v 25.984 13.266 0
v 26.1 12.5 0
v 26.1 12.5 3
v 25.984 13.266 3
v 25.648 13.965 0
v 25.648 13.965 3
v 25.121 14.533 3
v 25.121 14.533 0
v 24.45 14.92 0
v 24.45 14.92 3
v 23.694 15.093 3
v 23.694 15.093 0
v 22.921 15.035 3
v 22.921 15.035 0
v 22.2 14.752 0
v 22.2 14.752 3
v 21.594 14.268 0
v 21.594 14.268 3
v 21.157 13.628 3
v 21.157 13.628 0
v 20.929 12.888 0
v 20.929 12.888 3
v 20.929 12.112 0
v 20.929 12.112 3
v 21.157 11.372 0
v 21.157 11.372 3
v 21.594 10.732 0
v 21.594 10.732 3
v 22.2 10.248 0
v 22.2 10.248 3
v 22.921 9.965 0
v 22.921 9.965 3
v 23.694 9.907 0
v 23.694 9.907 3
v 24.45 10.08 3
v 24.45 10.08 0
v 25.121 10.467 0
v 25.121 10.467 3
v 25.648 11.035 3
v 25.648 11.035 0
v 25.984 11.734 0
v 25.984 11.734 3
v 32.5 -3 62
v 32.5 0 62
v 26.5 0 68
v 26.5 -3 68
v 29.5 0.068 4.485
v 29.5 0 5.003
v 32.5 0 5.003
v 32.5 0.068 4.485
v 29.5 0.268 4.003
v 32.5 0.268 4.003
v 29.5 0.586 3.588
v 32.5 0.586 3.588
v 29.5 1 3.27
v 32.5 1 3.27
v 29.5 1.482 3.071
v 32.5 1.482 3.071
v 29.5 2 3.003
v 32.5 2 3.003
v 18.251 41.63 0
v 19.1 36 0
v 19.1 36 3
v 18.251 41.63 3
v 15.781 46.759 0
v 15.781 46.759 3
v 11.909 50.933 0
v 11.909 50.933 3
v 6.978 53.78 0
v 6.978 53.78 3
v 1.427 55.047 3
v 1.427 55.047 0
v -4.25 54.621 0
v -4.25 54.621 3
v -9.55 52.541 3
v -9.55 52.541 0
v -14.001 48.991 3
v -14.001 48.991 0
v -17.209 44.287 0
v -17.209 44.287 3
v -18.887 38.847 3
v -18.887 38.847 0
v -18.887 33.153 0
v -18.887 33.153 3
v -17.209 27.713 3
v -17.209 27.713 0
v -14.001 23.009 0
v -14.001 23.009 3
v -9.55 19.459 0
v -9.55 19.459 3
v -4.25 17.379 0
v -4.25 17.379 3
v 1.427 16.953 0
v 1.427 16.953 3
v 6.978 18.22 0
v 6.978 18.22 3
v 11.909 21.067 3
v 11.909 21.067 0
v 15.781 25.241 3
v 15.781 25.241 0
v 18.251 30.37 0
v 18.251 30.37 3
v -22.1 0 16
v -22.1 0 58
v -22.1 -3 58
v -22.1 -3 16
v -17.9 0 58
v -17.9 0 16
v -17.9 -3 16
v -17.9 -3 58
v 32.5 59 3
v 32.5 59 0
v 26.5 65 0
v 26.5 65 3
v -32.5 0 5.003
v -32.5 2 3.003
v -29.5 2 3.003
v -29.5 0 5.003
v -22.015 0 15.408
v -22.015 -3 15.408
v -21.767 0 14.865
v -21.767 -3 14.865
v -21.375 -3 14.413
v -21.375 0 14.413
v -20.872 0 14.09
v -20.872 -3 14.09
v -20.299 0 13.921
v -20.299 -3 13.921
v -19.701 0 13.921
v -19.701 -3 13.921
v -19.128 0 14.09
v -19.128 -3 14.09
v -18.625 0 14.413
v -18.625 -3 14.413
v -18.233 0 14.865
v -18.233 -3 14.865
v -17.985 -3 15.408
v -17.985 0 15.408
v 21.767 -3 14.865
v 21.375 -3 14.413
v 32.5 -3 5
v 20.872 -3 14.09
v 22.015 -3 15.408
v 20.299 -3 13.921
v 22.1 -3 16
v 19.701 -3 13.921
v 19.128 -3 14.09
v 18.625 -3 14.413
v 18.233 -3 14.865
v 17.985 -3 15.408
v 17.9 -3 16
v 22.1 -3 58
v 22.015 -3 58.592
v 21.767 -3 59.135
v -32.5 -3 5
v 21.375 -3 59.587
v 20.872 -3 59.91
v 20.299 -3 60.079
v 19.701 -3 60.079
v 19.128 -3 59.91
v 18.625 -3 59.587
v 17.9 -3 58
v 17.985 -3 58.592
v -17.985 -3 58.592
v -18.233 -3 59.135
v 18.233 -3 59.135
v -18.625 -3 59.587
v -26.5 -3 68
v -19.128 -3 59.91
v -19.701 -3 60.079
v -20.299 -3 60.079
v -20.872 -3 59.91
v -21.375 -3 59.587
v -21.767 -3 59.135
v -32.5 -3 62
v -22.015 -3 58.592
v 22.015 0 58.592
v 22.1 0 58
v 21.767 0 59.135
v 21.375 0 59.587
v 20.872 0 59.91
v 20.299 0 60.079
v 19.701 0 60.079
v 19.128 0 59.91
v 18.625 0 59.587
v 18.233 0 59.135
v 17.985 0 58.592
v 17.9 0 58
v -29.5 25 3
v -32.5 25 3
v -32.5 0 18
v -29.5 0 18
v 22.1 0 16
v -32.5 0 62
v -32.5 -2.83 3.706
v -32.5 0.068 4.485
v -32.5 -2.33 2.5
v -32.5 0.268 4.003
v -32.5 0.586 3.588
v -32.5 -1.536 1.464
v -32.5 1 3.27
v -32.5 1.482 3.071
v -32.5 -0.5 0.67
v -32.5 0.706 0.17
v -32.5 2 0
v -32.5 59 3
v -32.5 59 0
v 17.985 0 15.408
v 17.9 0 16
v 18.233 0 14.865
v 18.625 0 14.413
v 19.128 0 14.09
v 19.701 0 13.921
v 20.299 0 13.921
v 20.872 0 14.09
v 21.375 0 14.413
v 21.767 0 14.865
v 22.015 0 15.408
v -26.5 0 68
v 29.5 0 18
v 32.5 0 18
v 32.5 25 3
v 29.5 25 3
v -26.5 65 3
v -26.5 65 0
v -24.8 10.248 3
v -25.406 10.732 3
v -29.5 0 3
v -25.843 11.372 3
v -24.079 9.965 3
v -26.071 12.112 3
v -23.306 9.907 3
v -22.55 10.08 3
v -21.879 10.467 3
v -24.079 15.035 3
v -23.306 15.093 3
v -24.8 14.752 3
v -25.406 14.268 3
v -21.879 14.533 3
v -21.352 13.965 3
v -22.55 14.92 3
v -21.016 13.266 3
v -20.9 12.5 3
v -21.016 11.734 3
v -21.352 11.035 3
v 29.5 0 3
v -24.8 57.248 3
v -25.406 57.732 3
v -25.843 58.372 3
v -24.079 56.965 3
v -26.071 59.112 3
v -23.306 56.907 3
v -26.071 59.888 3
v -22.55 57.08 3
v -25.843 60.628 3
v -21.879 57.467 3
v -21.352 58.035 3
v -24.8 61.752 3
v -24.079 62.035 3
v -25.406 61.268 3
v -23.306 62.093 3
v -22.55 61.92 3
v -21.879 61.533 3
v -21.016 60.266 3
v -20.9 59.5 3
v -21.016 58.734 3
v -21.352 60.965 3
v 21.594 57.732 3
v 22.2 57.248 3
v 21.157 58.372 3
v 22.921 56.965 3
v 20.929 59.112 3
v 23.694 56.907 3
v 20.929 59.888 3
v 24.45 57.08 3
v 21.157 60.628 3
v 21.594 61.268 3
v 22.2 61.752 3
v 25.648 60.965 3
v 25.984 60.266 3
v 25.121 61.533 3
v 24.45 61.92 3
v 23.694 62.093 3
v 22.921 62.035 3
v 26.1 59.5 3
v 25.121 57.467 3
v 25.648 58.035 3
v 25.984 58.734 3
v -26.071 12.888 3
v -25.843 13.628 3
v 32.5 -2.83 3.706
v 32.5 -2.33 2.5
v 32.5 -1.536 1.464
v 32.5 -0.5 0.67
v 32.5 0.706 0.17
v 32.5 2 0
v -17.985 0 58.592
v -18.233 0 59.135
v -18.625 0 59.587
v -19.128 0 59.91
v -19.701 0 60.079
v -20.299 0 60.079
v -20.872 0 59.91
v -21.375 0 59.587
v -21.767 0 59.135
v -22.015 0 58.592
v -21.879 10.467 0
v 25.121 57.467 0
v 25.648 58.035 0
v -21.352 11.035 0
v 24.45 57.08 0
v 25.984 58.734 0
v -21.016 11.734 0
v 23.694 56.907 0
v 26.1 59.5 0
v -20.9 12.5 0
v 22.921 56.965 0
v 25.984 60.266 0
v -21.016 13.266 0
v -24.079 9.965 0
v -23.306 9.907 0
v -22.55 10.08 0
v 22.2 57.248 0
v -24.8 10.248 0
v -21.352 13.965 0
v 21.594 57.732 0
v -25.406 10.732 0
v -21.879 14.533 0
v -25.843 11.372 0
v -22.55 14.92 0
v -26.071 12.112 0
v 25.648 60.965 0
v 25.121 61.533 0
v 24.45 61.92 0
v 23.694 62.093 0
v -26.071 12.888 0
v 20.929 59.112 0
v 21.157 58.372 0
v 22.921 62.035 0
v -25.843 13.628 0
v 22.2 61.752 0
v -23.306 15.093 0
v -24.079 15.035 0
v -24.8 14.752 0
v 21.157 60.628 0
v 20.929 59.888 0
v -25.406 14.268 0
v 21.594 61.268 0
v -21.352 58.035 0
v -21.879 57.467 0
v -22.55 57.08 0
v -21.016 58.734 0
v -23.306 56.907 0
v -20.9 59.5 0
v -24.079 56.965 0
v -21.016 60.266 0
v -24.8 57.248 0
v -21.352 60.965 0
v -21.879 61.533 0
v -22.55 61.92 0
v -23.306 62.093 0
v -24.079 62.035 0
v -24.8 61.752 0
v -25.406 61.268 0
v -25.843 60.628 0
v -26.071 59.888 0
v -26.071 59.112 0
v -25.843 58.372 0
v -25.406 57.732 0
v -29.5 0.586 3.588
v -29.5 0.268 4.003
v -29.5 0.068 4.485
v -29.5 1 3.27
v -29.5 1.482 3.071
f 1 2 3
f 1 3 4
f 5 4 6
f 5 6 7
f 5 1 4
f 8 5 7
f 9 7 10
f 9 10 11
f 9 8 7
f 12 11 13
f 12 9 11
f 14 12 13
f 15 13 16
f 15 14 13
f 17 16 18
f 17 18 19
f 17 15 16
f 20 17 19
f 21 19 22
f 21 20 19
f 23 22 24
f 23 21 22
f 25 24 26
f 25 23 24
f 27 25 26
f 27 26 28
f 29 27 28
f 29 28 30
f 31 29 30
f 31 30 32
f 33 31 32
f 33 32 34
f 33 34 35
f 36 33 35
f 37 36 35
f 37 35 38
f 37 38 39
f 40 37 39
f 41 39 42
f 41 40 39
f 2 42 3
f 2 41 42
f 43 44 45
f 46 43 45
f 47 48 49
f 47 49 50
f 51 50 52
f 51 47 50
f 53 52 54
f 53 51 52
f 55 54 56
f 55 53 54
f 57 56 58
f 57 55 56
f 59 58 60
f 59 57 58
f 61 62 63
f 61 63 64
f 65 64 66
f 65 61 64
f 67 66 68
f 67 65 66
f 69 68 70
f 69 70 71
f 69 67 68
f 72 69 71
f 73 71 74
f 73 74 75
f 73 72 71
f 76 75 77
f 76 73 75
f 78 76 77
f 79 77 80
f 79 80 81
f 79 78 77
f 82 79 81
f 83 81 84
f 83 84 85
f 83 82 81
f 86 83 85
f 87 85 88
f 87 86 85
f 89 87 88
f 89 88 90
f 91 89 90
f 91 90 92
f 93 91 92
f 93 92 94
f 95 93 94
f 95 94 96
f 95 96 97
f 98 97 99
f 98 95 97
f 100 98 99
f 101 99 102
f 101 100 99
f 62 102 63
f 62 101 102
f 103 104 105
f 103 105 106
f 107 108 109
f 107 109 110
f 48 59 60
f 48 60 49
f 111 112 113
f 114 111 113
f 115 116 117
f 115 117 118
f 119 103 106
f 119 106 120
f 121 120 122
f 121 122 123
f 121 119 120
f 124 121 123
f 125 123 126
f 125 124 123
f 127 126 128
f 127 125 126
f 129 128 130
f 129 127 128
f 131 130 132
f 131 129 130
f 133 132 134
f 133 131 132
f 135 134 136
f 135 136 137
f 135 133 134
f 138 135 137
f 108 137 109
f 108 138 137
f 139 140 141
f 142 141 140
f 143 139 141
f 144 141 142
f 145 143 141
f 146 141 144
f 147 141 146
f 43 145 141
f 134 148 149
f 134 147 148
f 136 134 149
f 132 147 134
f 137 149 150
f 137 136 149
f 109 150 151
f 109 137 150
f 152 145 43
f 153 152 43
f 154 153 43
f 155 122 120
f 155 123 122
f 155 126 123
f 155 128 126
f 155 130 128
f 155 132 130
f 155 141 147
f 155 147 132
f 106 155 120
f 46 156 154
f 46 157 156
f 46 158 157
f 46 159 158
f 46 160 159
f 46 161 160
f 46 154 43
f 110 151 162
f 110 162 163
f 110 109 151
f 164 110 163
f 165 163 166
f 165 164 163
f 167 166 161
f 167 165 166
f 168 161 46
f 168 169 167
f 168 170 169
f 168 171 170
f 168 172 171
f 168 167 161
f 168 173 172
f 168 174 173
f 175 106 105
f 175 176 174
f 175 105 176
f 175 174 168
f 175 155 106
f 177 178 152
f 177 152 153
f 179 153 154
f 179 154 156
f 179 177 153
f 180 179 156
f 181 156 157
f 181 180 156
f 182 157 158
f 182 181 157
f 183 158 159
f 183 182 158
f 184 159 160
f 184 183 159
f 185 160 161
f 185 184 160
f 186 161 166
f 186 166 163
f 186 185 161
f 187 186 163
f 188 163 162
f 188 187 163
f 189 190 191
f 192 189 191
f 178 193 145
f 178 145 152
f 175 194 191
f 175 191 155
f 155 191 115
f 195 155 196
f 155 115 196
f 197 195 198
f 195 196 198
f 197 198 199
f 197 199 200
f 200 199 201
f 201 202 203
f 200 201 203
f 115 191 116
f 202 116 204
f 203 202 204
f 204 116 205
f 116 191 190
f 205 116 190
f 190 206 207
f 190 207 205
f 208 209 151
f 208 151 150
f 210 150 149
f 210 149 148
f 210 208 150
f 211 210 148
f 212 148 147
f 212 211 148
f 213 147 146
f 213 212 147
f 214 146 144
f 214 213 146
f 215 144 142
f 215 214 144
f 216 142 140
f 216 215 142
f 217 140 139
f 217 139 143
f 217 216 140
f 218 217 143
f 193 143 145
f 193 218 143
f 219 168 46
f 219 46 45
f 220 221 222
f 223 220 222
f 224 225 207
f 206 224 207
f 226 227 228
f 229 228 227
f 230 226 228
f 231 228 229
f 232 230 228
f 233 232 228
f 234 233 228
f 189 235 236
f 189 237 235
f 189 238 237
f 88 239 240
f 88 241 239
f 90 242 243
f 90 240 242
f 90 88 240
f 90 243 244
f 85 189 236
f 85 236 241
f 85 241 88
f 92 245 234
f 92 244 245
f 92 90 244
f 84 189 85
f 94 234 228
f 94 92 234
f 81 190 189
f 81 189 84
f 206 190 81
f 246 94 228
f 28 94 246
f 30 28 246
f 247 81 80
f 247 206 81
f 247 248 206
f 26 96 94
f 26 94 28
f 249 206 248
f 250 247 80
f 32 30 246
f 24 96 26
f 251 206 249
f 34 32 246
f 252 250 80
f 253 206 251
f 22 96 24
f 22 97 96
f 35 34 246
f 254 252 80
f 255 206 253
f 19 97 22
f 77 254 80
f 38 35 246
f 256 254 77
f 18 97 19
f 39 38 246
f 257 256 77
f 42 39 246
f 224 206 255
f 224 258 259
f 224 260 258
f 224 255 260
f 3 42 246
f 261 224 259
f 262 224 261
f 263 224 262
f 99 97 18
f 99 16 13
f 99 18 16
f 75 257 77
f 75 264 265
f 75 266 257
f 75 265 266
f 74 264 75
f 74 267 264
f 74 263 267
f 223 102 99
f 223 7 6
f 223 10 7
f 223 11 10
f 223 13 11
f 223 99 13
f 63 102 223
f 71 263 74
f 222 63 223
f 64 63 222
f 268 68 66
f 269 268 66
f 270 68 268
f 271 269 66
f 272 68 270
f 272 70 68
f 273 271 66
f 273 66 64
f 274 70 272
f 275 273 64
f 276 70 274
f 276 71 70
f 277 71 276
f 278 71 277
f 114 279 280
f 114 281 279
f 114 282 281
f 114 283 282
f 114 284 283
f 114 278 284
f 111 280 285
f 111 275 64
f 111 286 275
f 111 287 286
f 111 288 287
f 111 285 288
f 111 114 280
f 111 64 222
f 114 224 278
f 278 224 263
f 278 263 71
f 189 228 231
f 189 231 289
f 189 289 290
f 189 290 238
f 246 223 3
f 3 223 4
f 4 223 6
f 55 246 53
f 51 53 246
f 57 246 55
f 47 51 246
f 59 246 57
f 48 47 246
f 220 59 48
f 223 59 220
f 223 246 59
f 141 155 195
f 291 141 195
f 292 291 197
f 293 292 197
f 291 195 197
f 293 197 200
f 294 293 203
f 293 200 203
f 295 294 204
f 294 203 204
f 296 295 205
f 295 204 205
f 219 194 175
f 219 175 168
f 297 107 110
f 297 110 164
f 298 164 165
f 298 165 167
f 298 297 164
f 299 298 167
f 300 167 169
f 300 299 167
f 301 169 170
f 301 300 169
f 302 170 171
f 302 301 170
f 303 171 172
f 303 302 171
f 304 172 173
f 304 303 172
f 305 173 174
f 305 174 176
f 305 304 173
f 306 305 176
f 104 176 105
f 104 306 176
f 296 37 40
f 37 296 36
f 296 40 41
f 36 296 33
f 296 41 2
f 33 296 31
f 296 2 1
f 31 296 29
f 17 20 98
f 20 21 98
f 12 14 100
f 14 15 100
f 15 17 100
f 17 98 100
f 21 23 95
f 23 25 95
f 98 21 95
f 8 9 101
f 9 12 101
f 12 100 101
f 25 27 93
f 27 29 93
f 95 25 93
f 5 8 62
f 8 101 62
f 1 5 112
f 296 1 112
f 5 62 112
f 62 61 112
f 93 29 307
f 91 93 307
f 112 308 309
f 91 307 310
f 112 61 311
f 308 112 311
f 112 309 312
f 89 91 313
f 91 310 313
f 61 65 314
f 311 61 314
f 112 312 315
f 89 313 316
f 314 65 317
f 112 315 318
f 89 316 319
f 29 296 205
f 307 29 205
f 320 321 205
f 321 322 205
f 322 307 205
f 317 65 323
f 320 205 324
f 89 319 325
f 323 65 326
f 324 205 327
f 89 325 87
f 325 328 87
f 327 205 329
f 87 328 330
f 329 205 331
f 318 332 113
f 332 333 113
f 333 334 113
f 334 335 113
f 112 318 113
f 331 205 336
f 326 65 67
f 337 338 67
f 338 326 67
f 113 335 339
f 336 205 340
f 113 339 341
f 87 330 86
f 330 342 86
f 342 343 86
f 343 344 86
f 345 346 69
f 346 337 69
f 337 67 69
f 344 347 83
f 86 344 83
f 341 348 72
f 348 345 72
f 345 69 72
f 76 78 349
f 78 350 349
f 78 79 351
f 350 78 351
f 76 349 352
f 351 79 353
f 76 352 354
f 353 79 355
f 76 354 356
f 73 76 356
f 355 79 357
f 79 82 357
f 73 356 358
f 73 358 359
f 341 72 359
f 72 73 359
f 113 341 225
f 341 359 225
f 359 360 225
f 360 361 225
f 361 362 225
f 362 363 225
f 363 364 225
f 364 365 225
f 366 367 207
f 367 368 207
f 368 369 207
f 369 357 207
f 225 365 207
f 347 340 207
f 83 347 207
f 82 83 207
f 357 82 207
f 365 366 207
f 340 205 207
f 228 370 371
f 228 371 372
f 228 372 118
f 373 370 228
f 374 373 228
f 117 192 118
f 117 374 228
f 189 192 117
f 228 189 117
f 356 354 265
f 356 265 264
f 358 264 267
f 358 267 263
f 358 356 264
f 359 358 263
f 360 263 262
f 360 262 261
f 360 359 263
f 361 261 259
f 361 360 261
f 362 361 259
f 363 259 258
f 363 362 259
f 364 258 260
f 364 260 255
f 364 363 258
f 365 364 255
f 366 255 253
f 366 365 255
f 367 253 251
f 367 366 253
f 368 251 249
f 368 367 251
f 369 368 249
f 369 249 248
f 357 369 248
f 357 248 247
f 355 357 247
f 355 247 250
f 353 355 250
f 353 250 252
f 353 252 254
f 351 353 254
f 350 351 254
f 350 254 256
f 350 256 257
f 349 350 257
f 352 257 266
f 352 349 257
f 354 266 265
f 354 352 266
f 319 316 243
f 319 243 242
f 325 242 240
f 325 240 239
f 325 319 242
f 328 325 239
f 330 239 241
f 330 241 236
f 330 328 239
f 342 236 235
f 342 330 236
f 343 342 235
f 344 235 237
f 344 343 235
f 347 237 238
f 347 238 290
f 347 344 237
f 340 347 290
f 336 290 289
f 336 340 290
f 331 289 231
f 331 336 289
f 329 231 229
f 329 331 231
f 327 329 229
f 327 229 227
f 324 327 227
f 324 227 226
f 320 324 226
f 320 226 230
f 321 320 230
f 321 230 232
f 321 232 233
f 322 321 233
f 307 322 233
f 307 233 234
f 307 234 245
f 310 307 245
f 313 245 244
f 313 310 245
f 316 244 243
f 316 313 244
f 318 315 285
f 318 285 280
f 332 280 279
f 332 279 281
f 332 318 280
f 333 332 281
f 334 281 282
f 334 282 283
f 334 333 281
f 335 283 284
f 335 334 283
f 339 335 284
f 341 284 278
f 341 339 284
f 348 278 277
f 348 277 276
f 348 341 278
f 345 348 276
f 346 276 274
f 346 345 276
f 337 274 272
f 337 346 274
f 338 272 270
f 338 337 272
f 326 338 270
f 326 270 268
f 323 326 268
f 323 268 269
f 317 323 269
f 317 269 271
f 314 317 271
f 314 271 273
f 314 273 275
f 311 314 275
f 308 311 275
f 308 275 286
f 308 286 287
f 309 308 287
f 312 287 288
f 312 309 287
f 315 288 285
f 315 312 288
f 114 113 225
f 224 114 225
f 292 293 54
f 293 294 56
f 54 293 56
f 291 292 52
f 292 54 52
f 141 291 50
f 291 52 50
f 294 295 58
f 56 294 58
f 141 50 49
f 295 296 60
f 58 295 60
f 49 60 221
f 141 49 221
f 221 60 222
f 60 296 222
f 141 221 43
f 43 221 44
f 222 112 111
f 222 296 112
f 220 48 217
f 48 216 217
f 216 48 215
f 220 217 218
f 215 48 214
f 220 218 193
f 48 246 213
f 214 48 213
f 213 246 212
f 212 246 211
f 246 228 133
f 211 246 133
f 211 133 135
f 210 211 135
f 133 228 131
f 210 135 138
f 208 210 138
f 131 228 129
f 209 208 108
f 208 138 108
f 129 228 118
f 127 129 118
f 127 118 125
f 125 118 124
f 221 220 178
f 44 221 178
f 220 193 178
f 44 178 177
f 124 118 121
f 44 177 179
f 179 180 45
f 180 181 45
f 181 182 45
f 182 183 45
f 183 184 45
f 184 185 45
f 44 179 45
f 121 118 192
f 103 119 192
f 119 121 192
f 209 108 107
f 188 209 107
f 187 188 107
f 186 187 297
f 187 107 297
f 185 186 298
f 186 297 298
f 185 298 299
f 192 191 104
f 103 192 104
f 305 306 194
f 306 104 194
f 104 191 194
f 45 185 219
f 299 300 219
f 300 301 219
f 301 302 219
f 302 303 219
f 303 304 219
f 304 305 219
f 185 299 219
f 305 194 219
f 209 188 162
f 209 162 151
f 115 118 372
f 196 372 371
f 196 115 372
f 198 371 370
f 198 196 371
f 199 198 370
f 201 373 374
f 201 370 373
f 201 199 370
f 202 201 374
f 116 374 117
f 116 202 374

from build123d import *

# Parameters (mm, degrees)
SKETCH1_R           = 19.1
SKETCH1_R_2         = 2.6
BOSS_EXTRUDE1_DEPTH = 3
SKETCH2_W           = 68
SKETCH2_H           = 3
BOSS_EXTRUDE2_DEPTH = 65
BOSS_EXTRUDE3_DEPTH = 3
BOSS_EXTRUDE4_DEPTH = 3
CUT_EXTRUDE1_DEPTH  = 3
CUT_EXTRUDE2_DEPTH  = 65


with BuildPart() as part:
    # Sketch1 → Boss-Extrude1 (new body)
    with BuildSketch(Plane.XY):
        Polygon((-32.5, 59), (-32.5, 0), (32.5, 0), (32.5, 59), (26.5, 65), (-26.5, 65), align=None)
        with Locations((0, 36)):
            Circle(SKETCH1_R, mode=Mode.SUBTRACT)
        with Locations((-23.5, 59.5)):
            Circle(SKETCH1_R_2, mode=Mode.SUBTRACT)
        with Locations((23.5, 59.5)):
            Circle(SKETCH1_R_2, mode=Mode.SUBTRACT)
        with Locations((23.5, 12.5)):
            Circle(SKETCH1_R_2, mode=Mode.SUBTRACT)
        with Locations((-23.5, 12.5)):
            Circle(SKETCH1_R_2, mode=Mode.SUBTRACT)
    extrude(amount=BOSS_EXTRUDE1_DEPTH)

    # Sketch2 → Boss-Extrude2 (add)
    with BuildSketch(Plane.ZY.offset(32.5)):
        with Locations((34, -1.5)):
            Rectangle(SKETCH2_W, SKETCH2_H)
    extrude(amount=-BOSS_EXTRUDE2_DEPTH)

    # Sketch3 → Boss-Extrude3 (add)
    with BuildSketch(Plane.ZY.offset(32.5)):
        Polygon((3, 25), (18, 0), (3, 0), align=None)
    extrude(amount=-BOSS_EXTRUDE3_DEPTH)

    # Sketch4 → Boss-Extrude4 (add)
    with BuildSketch(Plane(origin=(32.5, 0, 0), x_dir=(0, 0, -1), z_dir=(1, 0, 0))):
        Polygon((-3, 0), (-18, 0), (-3, 25), align=None)
    extrude(amount=-BOSS_EXTRUDE4_DEPTH)

    # Sketch5 → Cut-Extrude1 (cut)
    with BuildSketch(Plane(origin=(0, 0, 0), x_dir=(1, 0, 0), z_dir=(0, 1, 0))):
        Polygon((-32.5, -68), (-32.5, -62), (-26.5, -68), align=None)
        Polygon((32.5, -68), (32.5, -62), (26.5, -68), align=None)
        with BuildLine():
            Line((17.9, -58), (17.9, -16))
            ThreePointArc((17.9, -16), (20, -13.9), (22.1, -16))
            Line((22.1, -16), (22.1, -58))
            ThreePointArc((22.1, -58), (20, -60.1), (17.9, -58))
        make_face()
        with BuildLine():
            Line((-22.1, -58), (-22.1, -16))
            ThreePointArc((-22.1, -16), (-20, -13.9), (-17.9, -16))
            Line((-17.9, -16), (-17.9, -58))
            ThreePointArc((-17.9, -58), (-20, -60.1), (-22.1, -58))
        make_face()
    extrude(amount=-CUT_EXTRUDE1_DEPTH, mode=Mode.SUBTRACT)

    # Sketch6 → Cut-Extrude2 (cut)
    with BuildSketch(Plane.ZY.offset(32.5)):
        with BuildLine():
            Line((0, -3), (5, -3))
            ThreePointArc((5, -3), (1.464466094, -1.535533906), (0, 2))
            Line((0, 2), (0, -3))
        make_face()
        with BuildLine():
            Line((3.002550682, 2), (5.002550682, 0))
            ThreePointArc((5.002550682, 0), (3.58833712, 0.585786438), (3.002550682, 2))
        make_face()
    extrude(amount=-CUT_EXTRUDE2_DEPTH, mode=Mode.SUBTRACT)


solid = part.part
